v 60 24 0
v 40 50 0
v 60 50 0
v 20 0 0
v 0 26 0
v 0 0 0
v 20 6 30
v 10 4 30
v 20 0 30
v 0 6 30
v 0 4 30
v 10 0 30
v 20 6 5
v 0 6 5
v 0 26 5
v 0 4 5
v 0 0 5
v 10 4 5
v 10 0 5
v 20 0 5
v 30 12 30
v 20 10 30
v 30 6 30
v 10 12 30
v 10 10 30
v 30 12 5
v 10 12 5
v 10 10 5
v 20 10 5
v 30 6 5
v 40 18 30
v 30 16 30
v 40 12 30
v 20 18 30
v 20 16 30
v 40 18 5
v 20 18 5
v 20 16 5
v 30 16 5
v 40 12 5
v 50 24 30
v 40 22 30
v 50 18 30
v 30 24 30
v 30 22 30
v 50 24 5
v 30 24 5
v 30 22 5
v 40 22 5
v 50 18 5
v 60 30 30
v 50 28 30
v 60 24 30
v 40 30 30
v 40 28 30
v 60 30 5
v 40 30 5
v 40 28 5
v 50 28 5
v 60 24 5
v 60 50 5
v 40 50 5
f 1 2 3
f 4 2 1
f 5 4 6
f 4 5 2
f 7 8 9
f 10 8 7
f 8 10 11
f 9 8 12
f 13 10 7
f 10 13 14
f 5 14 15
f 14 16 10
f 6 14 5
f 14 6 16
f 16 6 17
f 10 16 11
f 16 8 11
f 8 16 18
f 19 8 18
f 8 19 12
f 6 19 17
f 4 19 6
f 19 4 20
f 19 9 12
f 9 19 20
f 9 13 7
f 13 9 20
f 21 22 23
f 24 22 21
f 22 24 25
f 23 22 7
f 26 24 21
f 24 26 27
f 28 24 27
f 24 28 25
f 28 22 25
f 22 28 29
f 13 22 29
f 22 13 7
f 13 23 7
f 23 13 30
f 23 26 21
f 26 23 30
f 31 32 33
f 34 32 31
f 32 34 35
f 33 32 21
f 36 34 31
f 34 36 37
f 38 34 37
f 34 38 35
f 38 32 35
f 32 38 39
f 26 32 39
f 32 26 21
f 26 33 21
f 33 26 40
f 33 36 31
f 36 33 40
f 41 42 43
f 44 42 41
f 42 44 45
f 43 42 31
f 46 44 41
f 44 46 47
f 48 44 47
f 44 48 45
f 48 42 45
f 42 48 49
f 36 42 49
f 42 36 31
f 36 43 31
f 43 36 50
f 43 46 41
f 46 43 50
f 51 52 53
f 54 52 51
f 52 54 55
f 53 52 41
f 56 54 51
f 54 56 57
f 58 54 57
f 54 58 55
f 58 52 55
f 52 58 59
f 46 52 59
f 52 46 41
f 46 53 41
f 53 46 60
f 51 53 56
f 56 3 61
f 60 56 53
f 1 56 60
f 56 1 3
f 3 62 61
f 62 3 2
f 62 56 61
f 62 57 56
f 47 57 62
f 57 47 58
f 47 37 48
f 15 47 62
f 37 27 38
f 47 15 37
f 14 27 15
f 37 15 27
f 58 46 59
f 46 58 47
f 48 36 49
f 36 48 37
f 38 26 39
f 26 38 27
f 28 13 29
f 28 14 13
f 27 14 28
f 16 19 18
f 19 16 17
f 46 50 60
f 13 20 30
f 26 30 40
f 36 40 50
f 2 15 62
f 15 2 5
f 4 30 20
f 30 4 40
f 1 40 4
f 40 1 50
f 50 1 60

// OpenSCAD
/* stairs.scad
 *
 * Copyright (C) Robert B. Ross, 2014
 *
 * This software is released under the Creative Commons 
 * Attribution-ShareAlike 4.0 International Public License.
 */

/******** STAIR MODULES ********/

stairs2(stairLen=10, stairHt=6, stairWidth = 30, stairCt = 5, incutLen = 10);
stairsSidewall(stairLen=10, stairHt=6, stairWidth = 30, stairCt = 5, incutLen = 10);

module stairs2(stairLen=10, stairHt=6, stairWidth = 30, stairCt = 5, incutLen = 10) 
{
       for (i = [0 : stairCt - 1]) {
       	   translate([i * (stairLen), i * stairHt, 0])
              stair(stairLen=10, stairHt=6, stairWidth = 30, stairCt = 5, incutLen = 10);
    }
}	      

module stairsSidewall(stairLen = 0, stairHt = 0, stairWidth = 0, stairCt = 0, incutLen = 0, sidewallWidth = 5, sidewallHt = 20) {
    linear_extrude(height = sidewallWidth)
	polygon(points = [[0,0], [0, sidewallHt + stairHt],
			  [(stairCt - 1) * stairLen, sidewallHt + stairCt * stairHt],
			  [stairCt * stairLen + incutLen, sidewallHt + stairCt * stairHt],
			  [stairCt * stairLen + incutLen, (stairCt - 1) * stairHt],
			  [stairLen + incutLen,0]],
		paths = [[0,1,2,3,4,5,0]]);
}

module stair() {
       incutHt = 4;
       bar = 2;

        linear_extrude(height=stairWidth)
              polygon(points = [[incutLen,0],
	      		        [incutLen,incutHt], 
	      		        [0, incutHt],
	      		        [0, stairHt],
				[stairLen+incutLen, stairHt],
				[stairLen+incutLen, 0]],
		      paths = [[0,1,2,3,4,5,0]]);
}

/* stairs() - build a set of stairs with a landing at the top
 *
 * Note: 
 * - stairsLength includes the top and bottom landings.
 * - bottom landing will be respected, top landing may grow.
 * - railing will extend above height of top of stairs by sidewallHt.
 * - height doesn't do anything special to take a roof into account.
 * - incut is considered as part of stairLength
 */
module stairs(stairsLength=100,
	      stairWidth=35, 
	      stairsHeight=65, 
	      stairLength = 19, 
	      floorThick=4, 
	      topLandingLength = 0, 
	      bottomLandingLength = 0,
	      sidewallHt = 20,
	      doSidewall = true,
	      doEndwall = true)
{
    incut = 5; // Amount that stairs are incut at the bottom
    
    /* See if additional space is needed at top landing. */
    endwallSpace = (doEndwall) ? wallThick : 0;
    addtlTopLanding = max(endwallSpace,
			  topLandingLength + endwallSpace - stairLength);

    stairCt = floor((stairsLength - addtlTopLanding - bottomLandingLength - incut) / stairLength);
    stairHt = (stairsHeight - floorThick) / stairCt;
    topLandingRealLength = stairsLength - stairCt * stairLength - bottomLandingLength;

    rotate([90,0,90])	linear_extrude(height = stairWidth) {
	for (i = [1 : stairCt]) {
	    translate([incut,0,0])
		polygon(points = [[(i-1)*stairLength + bottomLandingLength,
				   0], 
				  [(i-1)*stairLength + bottomLandingLength, 
				   (i-1) * stairHt + floorThick],
				  [-1 * incut + (i-1)*stairLength + bottomLandingLength, 
				   i * stairHt + floorThick], 
				  [i * stairLength + bottomLandingLength, 
				   i * stairHt + floorThick],
				  [i * stairLength + bottomLandingLength, 
				   0]],
			paths = [[0,1,2,3,4,0]]);
	}
    }

    /* Fill in region for top landing */
    translate([0, stairsLength - topLandingRealLength, 0])
	cube([stairWidth,
	      topLandingRealLength,
	      stairsHeight]);
    
    if (doSidewall) {
	/* Add the sidewall */
	rotate([90,0,90]) linear_extrude(height = wallThick) {
	    polygon(points = [[max(bottomLandingLength - incut,0),0],
			      [max(bottomLandingLength - incut, 0), 
			       sidewallHt + floorThick + stairHt],
			      [stairLength * (stairCt-1) + bottomLandingLength,
			       sidewallHt + stairsHeight],
			      [stairsLength, 
			       sidewallHt + stairsHeight],
			      [stairsLength, 0]],
		    paths = [[0,1,2,3,4,5,0]]);
	}
    }
    if (doEndwall) {
	translate([0,stairsLength - wallThick,0])
	    cube([stairWidth, wallThick, stairsHeight + sidewallHt]);
    }
}


/*
 * Local variables:
 *  mode: C
 *  c-indent-level: 4
 *  c-basic-offset: 4
 * End:
 *
 * vim: ts=8 sts=4 sw=4 expandtab
 */
